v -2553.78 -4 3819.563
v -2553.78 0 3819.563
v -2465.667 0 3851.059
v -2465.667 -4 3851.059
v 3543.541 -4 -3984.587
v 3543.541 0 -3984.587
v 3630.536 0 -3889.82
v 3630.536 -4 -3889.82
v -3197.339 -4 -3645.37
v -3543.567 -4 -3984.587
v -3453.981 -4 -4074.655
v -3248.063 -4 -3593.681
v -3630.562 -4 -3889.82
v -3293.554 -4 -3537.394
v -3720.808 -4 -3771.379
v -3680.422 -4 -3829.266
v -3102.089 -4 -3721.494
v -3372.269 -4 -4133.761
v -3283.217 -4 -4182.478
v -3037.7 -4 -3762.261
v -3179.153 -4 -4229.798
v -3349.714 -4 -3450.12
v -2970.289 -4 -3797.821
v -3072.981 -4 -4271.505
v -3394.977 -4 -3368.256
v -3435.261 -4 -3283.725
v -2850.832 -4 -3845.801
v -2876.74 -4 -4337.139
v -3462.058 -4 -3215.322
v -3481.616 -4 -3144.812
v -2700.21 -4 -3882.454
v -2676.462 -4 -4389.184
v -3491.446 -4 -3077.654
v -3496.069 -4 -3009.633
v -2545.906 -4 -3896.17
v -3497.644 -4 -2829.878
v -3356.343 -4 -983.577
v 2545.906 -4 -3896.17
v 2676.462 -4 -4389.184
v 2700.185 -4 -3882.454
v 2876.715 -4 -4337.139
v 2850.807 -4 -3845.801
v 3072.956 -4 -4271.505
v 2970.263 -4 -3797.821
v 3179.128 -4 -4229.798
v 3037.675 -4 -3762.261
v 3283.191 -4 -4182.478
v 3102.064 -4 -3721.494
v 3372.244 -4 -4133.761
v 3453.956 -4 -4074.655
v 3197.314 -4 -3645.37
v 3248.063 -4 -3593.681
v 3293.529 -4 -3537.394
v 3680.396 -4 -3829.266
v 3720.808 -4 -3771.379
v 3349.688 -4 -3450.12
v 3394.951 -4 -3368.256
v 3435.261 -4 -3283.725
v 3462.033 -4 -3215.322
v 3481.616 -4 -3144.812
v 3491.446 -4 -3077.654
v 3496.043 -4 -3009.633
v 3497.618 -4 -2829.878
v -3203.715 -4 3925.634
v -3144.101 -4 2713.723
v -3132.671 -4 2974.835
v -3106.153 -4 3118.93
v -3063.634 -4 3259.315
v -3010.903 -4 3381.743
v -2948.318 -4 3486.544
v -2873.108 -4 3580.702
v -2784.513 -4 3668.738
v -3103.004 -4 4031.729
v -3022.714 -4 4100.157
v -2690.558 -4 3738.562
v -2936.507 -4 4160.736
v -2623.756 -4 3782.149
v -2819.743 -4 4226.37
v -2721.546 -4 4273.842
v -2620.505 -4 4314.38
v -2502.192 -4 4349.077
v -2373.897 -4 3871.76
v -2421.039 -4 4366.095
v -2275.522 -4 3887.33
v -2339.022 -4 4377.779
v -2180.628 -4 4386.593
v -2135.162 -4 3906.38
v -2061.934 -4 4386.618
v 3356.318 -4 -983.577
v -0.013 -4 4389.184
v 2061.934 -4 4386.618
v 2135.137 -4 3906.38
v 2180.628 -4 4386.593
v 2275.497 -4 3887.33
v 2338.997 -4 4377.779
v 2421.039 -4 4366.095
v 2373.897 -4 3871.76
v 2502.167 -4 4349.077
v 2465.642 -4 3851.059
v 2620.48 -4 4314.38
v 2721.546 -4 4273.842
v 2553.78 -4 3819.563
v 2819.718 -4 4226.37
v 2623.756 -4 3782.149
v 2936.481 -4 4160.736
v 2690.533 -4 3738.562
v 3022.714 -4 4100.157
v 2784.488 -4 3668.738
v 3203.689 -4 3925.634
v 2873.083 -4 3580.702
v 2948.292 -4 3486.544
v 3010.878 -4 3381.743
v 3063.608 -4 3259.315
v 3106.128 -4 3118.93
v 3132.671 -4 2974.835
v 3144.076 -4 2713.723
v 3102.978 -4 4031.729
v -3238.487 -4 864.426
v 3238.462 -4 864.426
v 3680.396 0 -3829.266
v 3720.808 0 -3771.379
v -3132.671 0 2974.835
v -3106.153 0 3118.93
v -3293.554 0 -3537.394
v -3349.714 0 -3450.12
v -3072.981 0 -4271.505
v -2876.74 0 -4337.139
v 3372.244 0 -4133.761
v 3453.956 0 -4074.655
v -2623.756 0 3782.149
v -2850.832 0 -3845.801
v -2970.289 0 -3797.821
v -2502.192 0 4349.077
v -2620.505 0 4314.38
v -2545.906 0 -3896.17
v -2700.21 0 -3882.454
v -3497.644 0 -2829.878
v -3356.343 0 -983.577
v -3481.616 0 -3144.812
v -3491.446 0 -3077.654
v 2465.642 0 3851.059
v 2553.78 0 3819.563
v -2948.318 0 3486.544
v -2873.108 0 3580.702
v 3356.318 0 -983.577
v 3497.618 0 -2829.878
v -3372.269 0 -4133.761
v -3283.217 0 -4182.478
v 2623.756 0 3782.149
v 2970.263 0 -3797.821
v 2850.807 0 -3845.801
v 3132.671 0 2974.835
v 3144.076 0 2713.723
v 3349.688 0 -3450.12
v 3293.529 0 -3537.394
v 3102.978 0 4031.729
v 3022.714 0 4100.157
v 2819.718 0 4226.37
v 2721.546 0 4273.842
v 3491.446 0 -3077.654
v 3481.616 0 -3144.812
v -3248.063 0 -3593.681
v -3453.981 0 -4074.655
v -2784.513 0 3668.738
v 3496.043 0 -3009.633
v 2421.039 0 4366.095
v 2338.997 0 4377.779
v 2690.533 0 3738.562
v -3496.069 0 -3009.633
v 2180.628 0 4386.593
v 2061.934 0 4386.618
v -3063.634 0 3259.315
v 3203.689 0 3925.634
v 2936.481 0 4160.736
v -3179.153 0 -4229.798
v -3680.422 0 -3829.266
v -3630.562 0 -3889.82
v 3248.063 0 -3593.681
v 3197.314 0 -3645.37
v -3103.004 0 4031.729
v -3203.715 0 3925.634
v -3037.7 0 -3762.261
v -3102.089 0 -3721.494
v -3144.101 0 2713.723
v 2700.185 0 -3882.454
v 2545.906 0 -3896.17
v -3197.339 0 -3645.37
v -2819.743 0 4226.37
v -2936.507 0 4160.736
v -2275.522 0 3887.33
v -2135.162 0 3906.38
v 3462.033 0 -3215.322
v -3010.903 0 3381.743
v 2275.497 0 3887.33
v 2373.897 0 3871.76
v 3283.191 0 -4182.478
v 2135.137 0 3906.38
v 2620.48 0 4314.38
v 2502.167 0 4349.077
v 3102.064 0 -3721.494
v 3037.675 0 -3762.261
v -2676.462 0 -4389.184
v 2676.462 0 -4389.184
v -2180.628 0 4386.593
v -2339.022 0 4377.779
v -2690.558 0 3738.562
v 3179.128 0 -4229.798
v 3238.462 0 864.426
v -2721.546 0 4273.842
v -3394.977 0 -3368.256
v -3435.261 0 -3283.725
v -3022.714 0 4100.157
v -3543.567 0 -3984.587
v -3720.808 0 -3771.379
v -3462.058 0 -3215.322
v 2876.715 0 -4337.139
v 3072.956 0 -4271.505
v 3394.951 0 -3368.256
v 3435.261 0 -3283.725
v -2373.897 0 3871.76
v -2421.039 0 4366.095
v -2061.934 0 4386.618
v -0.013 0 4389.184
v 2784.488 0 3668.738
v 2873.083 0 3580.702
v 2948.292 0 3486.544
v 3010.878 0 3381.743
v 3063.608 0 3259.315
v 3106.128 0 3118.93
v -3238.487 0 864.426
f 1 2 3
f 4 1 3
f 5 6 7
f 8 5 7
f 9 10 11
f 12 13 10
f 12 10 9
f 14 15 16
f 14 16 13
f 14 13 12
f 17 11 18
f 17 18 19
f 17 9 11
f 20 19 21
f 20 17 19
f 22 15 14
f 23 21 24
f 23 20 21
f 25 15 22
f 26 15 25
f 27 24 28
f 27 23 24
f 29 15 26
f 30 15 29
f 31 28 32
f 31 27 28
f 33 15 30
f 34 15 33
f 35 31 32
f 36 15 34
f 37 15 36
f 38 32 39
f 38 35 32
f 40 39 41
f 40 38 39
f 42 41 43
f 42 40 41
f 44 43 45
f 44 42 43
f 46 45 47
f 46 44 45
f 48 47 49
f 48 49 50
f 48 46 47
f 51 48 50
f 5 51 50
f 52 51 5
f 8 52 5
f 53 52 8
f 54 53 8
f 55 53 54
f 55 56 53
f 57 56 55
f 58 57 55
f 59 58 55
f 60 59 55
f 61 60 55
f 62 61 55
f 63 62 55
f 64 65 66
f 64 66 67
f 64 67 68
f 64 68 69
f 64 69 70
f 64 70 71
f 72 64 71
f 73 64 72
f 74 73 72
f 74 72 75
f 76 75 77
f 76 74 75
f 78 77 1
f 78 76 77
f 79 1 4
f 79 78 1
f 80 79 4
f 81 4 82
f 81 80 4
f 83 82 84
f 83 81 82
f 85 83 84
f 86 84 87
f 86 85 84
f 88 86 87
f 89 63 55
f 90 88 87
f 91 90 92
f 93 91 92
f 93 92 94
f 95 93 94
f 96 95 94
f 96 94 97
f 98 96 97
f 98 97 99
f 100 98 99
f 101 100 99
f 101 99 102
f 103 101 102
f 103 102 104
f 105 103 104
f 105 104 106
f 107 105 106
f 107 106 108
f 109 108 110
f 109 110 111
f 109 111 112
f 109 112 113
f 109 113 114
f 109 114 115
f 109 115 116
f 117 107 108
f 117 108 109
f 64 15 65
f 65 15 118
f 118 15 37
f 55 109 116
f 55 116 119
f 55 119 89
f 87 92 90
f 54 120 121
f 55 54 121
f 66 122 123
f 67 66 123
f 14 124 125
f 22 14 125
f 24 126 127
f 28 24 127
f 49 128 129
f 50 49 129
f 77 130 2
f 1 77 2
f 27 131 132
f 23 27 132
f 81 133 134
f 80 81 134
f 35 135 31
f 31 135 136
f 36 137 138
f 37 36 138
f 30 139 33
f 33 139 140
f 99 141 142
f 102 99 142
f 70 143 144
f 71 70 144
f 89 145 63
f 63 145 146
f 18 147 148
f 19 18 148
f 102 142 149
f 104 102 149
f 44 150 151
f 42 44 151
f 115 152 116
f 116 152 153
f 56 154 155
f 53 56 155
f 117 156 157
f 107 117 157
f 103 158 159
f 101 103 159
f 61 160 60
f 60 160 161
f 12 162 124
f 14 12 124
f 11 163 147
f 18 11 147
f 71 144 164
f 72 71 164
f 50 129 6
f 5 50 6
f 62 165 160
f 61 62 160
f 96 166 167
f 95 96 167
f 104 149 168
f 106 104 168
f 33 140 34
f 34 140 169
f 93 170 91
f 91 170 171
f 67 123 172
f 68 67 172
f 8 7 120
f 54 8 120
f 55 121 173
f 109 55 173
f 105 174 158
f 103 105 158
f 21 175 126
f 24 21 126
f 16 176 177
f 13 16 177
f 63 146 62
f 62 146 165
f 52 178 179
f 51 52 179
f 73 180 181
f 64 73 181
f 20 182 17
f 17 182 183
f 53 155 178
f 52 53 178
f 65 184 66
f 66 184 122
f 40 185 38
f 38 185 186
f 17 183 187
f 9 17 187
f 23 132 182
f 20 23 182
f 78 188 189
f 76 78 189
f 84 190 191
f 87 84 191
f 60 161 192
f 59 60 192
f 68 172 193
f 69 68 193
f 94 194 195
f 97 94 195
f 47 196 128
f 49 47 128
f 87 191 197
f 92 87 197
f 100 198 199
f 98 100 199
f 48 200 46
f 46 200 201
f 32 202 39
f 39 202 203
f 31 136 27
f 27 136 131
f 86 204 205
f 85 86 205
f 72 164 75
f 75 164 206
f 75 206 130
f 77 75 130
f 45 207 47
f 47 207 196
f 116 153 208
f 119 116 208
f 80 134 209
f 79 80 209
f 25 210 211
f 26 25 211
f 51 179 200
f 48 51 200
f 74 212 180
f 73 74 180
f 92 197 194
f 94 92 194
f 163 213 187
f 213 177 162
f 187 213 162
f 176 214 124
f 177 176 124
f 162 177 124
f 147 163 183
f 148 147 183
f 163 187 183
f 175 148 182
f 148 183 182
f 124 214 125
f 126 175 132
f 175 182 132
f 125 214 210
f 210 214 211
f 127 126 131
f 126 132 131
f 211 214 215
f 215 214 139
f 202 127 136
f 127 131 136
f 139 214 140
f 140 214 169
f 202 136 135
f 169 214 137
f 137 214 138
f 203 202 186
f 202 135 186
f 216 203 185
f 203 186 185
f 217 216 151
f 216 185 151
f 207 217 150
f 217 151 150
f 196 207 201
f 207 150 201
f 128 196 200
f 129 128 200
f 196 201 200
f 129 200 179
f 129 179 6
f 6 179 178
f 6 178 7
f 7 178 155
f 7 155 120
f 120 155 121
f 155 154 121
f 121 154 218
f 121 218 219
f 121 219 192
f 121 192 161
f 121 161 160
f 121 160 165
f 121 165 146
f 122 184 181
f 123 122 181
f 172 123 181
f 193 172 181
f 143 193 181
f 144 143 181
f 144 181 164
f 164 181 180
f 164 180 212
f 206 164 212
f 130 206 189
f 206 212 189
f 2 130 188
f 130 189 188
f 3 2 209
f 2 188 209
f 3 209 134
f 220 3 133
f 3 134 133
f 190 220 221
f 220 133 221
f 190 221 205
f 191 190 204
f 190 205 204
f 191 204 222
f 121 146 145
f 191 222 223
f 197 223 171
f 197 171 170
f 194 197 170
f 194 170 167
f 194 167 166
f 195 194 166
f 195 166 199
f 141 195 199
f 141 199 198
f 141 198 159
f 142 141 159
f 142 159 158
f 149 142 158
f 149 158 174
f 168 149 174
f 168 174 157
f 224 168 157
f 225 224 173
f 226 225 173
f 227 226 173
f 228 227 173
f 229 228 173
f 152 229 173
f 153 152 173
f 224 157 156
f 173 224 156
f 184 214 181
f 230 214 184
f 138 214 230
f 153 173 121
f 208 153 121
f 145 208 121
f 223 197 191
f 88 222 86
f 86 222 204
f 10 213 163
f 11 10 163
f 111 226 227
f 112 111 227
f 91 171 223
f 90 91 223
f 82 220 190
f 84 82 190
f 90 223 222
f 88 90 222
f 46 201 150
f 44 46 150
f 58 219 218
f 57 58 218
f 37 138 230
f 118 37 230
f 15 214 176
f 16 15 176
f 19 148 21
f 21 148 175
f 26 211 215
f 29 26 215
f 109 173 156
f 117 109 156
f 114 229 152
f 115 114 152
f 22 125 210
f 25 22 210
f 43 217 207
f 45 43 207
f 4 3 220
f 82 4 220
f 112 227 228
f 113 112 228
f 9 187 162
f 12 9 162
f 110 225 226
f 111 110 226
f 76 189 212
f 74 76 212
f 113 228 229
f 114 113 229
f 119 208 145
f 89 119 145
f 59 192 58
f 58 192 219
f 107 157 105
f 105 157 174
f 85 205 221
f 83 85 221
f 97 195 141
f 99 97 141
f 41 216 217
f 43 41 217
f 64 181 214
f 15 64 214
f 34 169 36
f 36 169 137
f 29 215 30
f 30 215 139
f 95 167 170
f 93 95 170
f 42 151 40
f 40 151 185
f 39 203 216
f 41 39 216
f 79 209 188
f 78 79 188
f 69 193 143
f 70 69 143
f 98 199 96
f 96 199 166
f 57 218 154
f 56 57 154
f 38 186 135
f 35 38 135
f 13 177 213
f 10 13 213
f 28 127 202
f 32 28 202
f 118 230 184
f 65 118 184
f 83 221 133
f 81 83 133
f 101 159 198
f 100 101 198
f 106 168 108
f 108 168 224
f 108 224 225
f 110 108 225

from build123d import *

# Parameters (mm, degrees)
F1_DEPTH = 4


with BuildPart() as f1:
    # F0 (on Front) → F1 (new body)
    with BuildSketch(Plane.XZ):
        Polygon((-3103.0037, 4031.7293), (-3203.7147, 3925.6335), (-3720.8079, -3771.3793), (-3680.4219, -3829.2659), (-3630.5617, -3889.8195), (-3543.5667, -3984.5869), (-3453.9809, -4074.6553), (-3372.2691, -4133.7611), (-3283.2167, -4182.4783), (-3179.1529, -4229.7985), (-3072.9809, -4271.5053), (-2876.7405, -4337.1389), (-2676.4615, -4389.1835), (-0.0127, -4389.1835), (2676.4615, -4389.1835), (2876.7151, -4337.1389), (3072.9555, -4271.5053), (3179.1275, -4229.7985), (3283.1913, -4182.4783), (3372.2437, -4133.7611), (3453.9555, -4074.6553), (3543.5413, -3984.5869), (3630.5363, -3889.8195), (3680.3965, -3829.2659), (3720.8079, -3771.3793), (3203.6893, 3925.6335), (3102.9783, 4031.7293), (3022.7143, 4100.1569), (2936.4813, 4160.7359), (2819.7175, 4226.3695), (2721.5465, 4273.8421), (2620.4799, 4314.3805), (2502.1667, 4349.0769), (2421.0391, 4366.0949), (2338.9971, 4377.7789), (2180.6281, 4386.5927), (2061.9339, 4386.6181), (-0.0127, 4389.1835), (-2061.9339, 4386.6181), (-2180.6281, 4386.5927), (-2339.0225, 4377.7789), (-2421.0391, 4366.0949), (-2502.1921, 4349.0769), (-2620.5053, 4314.3805), (-2721.5465, 4273.8421), (-2819.7429, 4226.3695), (-2936.5067, 4160.7359), (-3022.7143, 4100.1569), align=None)
        Polygon((-3144.1009, 2713.7233), (-3132.6709, 2974.8353), (-3106.1533, 3118.9295), (-3063.6337, 3259.3153), (-3010.9033, 3381.7433), (-2948.3177, 3486.5437), (-2873.1083, 3580.7015), (-2784.5131, 3668.7379), (-2690.5585, 3738.5625), (-2623.7565, 3782.1489), (-2553.7795, 3819.5631), (-2465.6669, 3851.0591), (-2373.8967, 3871.7601), (-2275.5225, 3887.3303), (-2135.1621, 3906.3803), (-0.0127, 3906.3803), (2135.1367, 3906.3803), (2275.4971, 3887.3303), (2373.8967, 3871.7601), (2465.6415, 3851.0591), (2553.7795, 3819.5631), (2623.7565, 3782.1489), (2690.5331, 3738.5625), (2784.4877, 3668.7379), (2873.0829, 3580.7015), (2948.2923, 3486.5437), (3010.8779, 3381.7433), (3063.6083, 3259.3153), (3106.1279, 3118.9295), (3132.6709, 2974.8353), (3144.0755, 2713.7233), (3238.4619, 864.4255), (3356.3179, -983.5769), (3497.6181, -2829.8775), (3496.0433, -3009.6333), (3491.4459, -3077.6545), (3481.6161, -3144.8121), (3462.0327, -3215.3225), (3435.2611, -3283.7247), (3394.9513, -3368.2559), (3349.6885, -3450.1201), (3293.5291, -3537.3945), (3248.0631, -3593.6809), (3197.3139, -3645.3699), (3102.0639, -3721.4937), (3037.6749, -3762.2607), (2970.2633, -3797.8207), (2850.8071, -3845.8013), (2700.1851, -3882.4535), (2545.9055, -3896.1695), (-0.0127, -3896.1695), (-2545.9055, -3896.1695), (-2700.2105, -3882.4535), (-2850.8325, -3845.8013), (-2970.2887, -3797.8207), (-3037.7003, -3762.2607), (-3102.0893, -3721.4937), (-3197.3393, -3645.3699), (-3248.0631, -3593.6809), (-3293.5545, -3537.3945), (-3349.7139, -3450.1201), (-3394.9767, -3368.2559), (-3435.2611, -3283.7247), (-3462.0581, -3215.3225), (-3481.6161, -3144.8121), (-3491.4459, -3077.6545), (-3496.0687, -3009.6333), (-3497.6435, -2829.8775), (-3356.3433, -983.5769), (-3238.4873, 864.4255), align=None, mode=Mode.SUBTRACT)
    extrude(amount=F1_DEPTH)


solid = f1.part
